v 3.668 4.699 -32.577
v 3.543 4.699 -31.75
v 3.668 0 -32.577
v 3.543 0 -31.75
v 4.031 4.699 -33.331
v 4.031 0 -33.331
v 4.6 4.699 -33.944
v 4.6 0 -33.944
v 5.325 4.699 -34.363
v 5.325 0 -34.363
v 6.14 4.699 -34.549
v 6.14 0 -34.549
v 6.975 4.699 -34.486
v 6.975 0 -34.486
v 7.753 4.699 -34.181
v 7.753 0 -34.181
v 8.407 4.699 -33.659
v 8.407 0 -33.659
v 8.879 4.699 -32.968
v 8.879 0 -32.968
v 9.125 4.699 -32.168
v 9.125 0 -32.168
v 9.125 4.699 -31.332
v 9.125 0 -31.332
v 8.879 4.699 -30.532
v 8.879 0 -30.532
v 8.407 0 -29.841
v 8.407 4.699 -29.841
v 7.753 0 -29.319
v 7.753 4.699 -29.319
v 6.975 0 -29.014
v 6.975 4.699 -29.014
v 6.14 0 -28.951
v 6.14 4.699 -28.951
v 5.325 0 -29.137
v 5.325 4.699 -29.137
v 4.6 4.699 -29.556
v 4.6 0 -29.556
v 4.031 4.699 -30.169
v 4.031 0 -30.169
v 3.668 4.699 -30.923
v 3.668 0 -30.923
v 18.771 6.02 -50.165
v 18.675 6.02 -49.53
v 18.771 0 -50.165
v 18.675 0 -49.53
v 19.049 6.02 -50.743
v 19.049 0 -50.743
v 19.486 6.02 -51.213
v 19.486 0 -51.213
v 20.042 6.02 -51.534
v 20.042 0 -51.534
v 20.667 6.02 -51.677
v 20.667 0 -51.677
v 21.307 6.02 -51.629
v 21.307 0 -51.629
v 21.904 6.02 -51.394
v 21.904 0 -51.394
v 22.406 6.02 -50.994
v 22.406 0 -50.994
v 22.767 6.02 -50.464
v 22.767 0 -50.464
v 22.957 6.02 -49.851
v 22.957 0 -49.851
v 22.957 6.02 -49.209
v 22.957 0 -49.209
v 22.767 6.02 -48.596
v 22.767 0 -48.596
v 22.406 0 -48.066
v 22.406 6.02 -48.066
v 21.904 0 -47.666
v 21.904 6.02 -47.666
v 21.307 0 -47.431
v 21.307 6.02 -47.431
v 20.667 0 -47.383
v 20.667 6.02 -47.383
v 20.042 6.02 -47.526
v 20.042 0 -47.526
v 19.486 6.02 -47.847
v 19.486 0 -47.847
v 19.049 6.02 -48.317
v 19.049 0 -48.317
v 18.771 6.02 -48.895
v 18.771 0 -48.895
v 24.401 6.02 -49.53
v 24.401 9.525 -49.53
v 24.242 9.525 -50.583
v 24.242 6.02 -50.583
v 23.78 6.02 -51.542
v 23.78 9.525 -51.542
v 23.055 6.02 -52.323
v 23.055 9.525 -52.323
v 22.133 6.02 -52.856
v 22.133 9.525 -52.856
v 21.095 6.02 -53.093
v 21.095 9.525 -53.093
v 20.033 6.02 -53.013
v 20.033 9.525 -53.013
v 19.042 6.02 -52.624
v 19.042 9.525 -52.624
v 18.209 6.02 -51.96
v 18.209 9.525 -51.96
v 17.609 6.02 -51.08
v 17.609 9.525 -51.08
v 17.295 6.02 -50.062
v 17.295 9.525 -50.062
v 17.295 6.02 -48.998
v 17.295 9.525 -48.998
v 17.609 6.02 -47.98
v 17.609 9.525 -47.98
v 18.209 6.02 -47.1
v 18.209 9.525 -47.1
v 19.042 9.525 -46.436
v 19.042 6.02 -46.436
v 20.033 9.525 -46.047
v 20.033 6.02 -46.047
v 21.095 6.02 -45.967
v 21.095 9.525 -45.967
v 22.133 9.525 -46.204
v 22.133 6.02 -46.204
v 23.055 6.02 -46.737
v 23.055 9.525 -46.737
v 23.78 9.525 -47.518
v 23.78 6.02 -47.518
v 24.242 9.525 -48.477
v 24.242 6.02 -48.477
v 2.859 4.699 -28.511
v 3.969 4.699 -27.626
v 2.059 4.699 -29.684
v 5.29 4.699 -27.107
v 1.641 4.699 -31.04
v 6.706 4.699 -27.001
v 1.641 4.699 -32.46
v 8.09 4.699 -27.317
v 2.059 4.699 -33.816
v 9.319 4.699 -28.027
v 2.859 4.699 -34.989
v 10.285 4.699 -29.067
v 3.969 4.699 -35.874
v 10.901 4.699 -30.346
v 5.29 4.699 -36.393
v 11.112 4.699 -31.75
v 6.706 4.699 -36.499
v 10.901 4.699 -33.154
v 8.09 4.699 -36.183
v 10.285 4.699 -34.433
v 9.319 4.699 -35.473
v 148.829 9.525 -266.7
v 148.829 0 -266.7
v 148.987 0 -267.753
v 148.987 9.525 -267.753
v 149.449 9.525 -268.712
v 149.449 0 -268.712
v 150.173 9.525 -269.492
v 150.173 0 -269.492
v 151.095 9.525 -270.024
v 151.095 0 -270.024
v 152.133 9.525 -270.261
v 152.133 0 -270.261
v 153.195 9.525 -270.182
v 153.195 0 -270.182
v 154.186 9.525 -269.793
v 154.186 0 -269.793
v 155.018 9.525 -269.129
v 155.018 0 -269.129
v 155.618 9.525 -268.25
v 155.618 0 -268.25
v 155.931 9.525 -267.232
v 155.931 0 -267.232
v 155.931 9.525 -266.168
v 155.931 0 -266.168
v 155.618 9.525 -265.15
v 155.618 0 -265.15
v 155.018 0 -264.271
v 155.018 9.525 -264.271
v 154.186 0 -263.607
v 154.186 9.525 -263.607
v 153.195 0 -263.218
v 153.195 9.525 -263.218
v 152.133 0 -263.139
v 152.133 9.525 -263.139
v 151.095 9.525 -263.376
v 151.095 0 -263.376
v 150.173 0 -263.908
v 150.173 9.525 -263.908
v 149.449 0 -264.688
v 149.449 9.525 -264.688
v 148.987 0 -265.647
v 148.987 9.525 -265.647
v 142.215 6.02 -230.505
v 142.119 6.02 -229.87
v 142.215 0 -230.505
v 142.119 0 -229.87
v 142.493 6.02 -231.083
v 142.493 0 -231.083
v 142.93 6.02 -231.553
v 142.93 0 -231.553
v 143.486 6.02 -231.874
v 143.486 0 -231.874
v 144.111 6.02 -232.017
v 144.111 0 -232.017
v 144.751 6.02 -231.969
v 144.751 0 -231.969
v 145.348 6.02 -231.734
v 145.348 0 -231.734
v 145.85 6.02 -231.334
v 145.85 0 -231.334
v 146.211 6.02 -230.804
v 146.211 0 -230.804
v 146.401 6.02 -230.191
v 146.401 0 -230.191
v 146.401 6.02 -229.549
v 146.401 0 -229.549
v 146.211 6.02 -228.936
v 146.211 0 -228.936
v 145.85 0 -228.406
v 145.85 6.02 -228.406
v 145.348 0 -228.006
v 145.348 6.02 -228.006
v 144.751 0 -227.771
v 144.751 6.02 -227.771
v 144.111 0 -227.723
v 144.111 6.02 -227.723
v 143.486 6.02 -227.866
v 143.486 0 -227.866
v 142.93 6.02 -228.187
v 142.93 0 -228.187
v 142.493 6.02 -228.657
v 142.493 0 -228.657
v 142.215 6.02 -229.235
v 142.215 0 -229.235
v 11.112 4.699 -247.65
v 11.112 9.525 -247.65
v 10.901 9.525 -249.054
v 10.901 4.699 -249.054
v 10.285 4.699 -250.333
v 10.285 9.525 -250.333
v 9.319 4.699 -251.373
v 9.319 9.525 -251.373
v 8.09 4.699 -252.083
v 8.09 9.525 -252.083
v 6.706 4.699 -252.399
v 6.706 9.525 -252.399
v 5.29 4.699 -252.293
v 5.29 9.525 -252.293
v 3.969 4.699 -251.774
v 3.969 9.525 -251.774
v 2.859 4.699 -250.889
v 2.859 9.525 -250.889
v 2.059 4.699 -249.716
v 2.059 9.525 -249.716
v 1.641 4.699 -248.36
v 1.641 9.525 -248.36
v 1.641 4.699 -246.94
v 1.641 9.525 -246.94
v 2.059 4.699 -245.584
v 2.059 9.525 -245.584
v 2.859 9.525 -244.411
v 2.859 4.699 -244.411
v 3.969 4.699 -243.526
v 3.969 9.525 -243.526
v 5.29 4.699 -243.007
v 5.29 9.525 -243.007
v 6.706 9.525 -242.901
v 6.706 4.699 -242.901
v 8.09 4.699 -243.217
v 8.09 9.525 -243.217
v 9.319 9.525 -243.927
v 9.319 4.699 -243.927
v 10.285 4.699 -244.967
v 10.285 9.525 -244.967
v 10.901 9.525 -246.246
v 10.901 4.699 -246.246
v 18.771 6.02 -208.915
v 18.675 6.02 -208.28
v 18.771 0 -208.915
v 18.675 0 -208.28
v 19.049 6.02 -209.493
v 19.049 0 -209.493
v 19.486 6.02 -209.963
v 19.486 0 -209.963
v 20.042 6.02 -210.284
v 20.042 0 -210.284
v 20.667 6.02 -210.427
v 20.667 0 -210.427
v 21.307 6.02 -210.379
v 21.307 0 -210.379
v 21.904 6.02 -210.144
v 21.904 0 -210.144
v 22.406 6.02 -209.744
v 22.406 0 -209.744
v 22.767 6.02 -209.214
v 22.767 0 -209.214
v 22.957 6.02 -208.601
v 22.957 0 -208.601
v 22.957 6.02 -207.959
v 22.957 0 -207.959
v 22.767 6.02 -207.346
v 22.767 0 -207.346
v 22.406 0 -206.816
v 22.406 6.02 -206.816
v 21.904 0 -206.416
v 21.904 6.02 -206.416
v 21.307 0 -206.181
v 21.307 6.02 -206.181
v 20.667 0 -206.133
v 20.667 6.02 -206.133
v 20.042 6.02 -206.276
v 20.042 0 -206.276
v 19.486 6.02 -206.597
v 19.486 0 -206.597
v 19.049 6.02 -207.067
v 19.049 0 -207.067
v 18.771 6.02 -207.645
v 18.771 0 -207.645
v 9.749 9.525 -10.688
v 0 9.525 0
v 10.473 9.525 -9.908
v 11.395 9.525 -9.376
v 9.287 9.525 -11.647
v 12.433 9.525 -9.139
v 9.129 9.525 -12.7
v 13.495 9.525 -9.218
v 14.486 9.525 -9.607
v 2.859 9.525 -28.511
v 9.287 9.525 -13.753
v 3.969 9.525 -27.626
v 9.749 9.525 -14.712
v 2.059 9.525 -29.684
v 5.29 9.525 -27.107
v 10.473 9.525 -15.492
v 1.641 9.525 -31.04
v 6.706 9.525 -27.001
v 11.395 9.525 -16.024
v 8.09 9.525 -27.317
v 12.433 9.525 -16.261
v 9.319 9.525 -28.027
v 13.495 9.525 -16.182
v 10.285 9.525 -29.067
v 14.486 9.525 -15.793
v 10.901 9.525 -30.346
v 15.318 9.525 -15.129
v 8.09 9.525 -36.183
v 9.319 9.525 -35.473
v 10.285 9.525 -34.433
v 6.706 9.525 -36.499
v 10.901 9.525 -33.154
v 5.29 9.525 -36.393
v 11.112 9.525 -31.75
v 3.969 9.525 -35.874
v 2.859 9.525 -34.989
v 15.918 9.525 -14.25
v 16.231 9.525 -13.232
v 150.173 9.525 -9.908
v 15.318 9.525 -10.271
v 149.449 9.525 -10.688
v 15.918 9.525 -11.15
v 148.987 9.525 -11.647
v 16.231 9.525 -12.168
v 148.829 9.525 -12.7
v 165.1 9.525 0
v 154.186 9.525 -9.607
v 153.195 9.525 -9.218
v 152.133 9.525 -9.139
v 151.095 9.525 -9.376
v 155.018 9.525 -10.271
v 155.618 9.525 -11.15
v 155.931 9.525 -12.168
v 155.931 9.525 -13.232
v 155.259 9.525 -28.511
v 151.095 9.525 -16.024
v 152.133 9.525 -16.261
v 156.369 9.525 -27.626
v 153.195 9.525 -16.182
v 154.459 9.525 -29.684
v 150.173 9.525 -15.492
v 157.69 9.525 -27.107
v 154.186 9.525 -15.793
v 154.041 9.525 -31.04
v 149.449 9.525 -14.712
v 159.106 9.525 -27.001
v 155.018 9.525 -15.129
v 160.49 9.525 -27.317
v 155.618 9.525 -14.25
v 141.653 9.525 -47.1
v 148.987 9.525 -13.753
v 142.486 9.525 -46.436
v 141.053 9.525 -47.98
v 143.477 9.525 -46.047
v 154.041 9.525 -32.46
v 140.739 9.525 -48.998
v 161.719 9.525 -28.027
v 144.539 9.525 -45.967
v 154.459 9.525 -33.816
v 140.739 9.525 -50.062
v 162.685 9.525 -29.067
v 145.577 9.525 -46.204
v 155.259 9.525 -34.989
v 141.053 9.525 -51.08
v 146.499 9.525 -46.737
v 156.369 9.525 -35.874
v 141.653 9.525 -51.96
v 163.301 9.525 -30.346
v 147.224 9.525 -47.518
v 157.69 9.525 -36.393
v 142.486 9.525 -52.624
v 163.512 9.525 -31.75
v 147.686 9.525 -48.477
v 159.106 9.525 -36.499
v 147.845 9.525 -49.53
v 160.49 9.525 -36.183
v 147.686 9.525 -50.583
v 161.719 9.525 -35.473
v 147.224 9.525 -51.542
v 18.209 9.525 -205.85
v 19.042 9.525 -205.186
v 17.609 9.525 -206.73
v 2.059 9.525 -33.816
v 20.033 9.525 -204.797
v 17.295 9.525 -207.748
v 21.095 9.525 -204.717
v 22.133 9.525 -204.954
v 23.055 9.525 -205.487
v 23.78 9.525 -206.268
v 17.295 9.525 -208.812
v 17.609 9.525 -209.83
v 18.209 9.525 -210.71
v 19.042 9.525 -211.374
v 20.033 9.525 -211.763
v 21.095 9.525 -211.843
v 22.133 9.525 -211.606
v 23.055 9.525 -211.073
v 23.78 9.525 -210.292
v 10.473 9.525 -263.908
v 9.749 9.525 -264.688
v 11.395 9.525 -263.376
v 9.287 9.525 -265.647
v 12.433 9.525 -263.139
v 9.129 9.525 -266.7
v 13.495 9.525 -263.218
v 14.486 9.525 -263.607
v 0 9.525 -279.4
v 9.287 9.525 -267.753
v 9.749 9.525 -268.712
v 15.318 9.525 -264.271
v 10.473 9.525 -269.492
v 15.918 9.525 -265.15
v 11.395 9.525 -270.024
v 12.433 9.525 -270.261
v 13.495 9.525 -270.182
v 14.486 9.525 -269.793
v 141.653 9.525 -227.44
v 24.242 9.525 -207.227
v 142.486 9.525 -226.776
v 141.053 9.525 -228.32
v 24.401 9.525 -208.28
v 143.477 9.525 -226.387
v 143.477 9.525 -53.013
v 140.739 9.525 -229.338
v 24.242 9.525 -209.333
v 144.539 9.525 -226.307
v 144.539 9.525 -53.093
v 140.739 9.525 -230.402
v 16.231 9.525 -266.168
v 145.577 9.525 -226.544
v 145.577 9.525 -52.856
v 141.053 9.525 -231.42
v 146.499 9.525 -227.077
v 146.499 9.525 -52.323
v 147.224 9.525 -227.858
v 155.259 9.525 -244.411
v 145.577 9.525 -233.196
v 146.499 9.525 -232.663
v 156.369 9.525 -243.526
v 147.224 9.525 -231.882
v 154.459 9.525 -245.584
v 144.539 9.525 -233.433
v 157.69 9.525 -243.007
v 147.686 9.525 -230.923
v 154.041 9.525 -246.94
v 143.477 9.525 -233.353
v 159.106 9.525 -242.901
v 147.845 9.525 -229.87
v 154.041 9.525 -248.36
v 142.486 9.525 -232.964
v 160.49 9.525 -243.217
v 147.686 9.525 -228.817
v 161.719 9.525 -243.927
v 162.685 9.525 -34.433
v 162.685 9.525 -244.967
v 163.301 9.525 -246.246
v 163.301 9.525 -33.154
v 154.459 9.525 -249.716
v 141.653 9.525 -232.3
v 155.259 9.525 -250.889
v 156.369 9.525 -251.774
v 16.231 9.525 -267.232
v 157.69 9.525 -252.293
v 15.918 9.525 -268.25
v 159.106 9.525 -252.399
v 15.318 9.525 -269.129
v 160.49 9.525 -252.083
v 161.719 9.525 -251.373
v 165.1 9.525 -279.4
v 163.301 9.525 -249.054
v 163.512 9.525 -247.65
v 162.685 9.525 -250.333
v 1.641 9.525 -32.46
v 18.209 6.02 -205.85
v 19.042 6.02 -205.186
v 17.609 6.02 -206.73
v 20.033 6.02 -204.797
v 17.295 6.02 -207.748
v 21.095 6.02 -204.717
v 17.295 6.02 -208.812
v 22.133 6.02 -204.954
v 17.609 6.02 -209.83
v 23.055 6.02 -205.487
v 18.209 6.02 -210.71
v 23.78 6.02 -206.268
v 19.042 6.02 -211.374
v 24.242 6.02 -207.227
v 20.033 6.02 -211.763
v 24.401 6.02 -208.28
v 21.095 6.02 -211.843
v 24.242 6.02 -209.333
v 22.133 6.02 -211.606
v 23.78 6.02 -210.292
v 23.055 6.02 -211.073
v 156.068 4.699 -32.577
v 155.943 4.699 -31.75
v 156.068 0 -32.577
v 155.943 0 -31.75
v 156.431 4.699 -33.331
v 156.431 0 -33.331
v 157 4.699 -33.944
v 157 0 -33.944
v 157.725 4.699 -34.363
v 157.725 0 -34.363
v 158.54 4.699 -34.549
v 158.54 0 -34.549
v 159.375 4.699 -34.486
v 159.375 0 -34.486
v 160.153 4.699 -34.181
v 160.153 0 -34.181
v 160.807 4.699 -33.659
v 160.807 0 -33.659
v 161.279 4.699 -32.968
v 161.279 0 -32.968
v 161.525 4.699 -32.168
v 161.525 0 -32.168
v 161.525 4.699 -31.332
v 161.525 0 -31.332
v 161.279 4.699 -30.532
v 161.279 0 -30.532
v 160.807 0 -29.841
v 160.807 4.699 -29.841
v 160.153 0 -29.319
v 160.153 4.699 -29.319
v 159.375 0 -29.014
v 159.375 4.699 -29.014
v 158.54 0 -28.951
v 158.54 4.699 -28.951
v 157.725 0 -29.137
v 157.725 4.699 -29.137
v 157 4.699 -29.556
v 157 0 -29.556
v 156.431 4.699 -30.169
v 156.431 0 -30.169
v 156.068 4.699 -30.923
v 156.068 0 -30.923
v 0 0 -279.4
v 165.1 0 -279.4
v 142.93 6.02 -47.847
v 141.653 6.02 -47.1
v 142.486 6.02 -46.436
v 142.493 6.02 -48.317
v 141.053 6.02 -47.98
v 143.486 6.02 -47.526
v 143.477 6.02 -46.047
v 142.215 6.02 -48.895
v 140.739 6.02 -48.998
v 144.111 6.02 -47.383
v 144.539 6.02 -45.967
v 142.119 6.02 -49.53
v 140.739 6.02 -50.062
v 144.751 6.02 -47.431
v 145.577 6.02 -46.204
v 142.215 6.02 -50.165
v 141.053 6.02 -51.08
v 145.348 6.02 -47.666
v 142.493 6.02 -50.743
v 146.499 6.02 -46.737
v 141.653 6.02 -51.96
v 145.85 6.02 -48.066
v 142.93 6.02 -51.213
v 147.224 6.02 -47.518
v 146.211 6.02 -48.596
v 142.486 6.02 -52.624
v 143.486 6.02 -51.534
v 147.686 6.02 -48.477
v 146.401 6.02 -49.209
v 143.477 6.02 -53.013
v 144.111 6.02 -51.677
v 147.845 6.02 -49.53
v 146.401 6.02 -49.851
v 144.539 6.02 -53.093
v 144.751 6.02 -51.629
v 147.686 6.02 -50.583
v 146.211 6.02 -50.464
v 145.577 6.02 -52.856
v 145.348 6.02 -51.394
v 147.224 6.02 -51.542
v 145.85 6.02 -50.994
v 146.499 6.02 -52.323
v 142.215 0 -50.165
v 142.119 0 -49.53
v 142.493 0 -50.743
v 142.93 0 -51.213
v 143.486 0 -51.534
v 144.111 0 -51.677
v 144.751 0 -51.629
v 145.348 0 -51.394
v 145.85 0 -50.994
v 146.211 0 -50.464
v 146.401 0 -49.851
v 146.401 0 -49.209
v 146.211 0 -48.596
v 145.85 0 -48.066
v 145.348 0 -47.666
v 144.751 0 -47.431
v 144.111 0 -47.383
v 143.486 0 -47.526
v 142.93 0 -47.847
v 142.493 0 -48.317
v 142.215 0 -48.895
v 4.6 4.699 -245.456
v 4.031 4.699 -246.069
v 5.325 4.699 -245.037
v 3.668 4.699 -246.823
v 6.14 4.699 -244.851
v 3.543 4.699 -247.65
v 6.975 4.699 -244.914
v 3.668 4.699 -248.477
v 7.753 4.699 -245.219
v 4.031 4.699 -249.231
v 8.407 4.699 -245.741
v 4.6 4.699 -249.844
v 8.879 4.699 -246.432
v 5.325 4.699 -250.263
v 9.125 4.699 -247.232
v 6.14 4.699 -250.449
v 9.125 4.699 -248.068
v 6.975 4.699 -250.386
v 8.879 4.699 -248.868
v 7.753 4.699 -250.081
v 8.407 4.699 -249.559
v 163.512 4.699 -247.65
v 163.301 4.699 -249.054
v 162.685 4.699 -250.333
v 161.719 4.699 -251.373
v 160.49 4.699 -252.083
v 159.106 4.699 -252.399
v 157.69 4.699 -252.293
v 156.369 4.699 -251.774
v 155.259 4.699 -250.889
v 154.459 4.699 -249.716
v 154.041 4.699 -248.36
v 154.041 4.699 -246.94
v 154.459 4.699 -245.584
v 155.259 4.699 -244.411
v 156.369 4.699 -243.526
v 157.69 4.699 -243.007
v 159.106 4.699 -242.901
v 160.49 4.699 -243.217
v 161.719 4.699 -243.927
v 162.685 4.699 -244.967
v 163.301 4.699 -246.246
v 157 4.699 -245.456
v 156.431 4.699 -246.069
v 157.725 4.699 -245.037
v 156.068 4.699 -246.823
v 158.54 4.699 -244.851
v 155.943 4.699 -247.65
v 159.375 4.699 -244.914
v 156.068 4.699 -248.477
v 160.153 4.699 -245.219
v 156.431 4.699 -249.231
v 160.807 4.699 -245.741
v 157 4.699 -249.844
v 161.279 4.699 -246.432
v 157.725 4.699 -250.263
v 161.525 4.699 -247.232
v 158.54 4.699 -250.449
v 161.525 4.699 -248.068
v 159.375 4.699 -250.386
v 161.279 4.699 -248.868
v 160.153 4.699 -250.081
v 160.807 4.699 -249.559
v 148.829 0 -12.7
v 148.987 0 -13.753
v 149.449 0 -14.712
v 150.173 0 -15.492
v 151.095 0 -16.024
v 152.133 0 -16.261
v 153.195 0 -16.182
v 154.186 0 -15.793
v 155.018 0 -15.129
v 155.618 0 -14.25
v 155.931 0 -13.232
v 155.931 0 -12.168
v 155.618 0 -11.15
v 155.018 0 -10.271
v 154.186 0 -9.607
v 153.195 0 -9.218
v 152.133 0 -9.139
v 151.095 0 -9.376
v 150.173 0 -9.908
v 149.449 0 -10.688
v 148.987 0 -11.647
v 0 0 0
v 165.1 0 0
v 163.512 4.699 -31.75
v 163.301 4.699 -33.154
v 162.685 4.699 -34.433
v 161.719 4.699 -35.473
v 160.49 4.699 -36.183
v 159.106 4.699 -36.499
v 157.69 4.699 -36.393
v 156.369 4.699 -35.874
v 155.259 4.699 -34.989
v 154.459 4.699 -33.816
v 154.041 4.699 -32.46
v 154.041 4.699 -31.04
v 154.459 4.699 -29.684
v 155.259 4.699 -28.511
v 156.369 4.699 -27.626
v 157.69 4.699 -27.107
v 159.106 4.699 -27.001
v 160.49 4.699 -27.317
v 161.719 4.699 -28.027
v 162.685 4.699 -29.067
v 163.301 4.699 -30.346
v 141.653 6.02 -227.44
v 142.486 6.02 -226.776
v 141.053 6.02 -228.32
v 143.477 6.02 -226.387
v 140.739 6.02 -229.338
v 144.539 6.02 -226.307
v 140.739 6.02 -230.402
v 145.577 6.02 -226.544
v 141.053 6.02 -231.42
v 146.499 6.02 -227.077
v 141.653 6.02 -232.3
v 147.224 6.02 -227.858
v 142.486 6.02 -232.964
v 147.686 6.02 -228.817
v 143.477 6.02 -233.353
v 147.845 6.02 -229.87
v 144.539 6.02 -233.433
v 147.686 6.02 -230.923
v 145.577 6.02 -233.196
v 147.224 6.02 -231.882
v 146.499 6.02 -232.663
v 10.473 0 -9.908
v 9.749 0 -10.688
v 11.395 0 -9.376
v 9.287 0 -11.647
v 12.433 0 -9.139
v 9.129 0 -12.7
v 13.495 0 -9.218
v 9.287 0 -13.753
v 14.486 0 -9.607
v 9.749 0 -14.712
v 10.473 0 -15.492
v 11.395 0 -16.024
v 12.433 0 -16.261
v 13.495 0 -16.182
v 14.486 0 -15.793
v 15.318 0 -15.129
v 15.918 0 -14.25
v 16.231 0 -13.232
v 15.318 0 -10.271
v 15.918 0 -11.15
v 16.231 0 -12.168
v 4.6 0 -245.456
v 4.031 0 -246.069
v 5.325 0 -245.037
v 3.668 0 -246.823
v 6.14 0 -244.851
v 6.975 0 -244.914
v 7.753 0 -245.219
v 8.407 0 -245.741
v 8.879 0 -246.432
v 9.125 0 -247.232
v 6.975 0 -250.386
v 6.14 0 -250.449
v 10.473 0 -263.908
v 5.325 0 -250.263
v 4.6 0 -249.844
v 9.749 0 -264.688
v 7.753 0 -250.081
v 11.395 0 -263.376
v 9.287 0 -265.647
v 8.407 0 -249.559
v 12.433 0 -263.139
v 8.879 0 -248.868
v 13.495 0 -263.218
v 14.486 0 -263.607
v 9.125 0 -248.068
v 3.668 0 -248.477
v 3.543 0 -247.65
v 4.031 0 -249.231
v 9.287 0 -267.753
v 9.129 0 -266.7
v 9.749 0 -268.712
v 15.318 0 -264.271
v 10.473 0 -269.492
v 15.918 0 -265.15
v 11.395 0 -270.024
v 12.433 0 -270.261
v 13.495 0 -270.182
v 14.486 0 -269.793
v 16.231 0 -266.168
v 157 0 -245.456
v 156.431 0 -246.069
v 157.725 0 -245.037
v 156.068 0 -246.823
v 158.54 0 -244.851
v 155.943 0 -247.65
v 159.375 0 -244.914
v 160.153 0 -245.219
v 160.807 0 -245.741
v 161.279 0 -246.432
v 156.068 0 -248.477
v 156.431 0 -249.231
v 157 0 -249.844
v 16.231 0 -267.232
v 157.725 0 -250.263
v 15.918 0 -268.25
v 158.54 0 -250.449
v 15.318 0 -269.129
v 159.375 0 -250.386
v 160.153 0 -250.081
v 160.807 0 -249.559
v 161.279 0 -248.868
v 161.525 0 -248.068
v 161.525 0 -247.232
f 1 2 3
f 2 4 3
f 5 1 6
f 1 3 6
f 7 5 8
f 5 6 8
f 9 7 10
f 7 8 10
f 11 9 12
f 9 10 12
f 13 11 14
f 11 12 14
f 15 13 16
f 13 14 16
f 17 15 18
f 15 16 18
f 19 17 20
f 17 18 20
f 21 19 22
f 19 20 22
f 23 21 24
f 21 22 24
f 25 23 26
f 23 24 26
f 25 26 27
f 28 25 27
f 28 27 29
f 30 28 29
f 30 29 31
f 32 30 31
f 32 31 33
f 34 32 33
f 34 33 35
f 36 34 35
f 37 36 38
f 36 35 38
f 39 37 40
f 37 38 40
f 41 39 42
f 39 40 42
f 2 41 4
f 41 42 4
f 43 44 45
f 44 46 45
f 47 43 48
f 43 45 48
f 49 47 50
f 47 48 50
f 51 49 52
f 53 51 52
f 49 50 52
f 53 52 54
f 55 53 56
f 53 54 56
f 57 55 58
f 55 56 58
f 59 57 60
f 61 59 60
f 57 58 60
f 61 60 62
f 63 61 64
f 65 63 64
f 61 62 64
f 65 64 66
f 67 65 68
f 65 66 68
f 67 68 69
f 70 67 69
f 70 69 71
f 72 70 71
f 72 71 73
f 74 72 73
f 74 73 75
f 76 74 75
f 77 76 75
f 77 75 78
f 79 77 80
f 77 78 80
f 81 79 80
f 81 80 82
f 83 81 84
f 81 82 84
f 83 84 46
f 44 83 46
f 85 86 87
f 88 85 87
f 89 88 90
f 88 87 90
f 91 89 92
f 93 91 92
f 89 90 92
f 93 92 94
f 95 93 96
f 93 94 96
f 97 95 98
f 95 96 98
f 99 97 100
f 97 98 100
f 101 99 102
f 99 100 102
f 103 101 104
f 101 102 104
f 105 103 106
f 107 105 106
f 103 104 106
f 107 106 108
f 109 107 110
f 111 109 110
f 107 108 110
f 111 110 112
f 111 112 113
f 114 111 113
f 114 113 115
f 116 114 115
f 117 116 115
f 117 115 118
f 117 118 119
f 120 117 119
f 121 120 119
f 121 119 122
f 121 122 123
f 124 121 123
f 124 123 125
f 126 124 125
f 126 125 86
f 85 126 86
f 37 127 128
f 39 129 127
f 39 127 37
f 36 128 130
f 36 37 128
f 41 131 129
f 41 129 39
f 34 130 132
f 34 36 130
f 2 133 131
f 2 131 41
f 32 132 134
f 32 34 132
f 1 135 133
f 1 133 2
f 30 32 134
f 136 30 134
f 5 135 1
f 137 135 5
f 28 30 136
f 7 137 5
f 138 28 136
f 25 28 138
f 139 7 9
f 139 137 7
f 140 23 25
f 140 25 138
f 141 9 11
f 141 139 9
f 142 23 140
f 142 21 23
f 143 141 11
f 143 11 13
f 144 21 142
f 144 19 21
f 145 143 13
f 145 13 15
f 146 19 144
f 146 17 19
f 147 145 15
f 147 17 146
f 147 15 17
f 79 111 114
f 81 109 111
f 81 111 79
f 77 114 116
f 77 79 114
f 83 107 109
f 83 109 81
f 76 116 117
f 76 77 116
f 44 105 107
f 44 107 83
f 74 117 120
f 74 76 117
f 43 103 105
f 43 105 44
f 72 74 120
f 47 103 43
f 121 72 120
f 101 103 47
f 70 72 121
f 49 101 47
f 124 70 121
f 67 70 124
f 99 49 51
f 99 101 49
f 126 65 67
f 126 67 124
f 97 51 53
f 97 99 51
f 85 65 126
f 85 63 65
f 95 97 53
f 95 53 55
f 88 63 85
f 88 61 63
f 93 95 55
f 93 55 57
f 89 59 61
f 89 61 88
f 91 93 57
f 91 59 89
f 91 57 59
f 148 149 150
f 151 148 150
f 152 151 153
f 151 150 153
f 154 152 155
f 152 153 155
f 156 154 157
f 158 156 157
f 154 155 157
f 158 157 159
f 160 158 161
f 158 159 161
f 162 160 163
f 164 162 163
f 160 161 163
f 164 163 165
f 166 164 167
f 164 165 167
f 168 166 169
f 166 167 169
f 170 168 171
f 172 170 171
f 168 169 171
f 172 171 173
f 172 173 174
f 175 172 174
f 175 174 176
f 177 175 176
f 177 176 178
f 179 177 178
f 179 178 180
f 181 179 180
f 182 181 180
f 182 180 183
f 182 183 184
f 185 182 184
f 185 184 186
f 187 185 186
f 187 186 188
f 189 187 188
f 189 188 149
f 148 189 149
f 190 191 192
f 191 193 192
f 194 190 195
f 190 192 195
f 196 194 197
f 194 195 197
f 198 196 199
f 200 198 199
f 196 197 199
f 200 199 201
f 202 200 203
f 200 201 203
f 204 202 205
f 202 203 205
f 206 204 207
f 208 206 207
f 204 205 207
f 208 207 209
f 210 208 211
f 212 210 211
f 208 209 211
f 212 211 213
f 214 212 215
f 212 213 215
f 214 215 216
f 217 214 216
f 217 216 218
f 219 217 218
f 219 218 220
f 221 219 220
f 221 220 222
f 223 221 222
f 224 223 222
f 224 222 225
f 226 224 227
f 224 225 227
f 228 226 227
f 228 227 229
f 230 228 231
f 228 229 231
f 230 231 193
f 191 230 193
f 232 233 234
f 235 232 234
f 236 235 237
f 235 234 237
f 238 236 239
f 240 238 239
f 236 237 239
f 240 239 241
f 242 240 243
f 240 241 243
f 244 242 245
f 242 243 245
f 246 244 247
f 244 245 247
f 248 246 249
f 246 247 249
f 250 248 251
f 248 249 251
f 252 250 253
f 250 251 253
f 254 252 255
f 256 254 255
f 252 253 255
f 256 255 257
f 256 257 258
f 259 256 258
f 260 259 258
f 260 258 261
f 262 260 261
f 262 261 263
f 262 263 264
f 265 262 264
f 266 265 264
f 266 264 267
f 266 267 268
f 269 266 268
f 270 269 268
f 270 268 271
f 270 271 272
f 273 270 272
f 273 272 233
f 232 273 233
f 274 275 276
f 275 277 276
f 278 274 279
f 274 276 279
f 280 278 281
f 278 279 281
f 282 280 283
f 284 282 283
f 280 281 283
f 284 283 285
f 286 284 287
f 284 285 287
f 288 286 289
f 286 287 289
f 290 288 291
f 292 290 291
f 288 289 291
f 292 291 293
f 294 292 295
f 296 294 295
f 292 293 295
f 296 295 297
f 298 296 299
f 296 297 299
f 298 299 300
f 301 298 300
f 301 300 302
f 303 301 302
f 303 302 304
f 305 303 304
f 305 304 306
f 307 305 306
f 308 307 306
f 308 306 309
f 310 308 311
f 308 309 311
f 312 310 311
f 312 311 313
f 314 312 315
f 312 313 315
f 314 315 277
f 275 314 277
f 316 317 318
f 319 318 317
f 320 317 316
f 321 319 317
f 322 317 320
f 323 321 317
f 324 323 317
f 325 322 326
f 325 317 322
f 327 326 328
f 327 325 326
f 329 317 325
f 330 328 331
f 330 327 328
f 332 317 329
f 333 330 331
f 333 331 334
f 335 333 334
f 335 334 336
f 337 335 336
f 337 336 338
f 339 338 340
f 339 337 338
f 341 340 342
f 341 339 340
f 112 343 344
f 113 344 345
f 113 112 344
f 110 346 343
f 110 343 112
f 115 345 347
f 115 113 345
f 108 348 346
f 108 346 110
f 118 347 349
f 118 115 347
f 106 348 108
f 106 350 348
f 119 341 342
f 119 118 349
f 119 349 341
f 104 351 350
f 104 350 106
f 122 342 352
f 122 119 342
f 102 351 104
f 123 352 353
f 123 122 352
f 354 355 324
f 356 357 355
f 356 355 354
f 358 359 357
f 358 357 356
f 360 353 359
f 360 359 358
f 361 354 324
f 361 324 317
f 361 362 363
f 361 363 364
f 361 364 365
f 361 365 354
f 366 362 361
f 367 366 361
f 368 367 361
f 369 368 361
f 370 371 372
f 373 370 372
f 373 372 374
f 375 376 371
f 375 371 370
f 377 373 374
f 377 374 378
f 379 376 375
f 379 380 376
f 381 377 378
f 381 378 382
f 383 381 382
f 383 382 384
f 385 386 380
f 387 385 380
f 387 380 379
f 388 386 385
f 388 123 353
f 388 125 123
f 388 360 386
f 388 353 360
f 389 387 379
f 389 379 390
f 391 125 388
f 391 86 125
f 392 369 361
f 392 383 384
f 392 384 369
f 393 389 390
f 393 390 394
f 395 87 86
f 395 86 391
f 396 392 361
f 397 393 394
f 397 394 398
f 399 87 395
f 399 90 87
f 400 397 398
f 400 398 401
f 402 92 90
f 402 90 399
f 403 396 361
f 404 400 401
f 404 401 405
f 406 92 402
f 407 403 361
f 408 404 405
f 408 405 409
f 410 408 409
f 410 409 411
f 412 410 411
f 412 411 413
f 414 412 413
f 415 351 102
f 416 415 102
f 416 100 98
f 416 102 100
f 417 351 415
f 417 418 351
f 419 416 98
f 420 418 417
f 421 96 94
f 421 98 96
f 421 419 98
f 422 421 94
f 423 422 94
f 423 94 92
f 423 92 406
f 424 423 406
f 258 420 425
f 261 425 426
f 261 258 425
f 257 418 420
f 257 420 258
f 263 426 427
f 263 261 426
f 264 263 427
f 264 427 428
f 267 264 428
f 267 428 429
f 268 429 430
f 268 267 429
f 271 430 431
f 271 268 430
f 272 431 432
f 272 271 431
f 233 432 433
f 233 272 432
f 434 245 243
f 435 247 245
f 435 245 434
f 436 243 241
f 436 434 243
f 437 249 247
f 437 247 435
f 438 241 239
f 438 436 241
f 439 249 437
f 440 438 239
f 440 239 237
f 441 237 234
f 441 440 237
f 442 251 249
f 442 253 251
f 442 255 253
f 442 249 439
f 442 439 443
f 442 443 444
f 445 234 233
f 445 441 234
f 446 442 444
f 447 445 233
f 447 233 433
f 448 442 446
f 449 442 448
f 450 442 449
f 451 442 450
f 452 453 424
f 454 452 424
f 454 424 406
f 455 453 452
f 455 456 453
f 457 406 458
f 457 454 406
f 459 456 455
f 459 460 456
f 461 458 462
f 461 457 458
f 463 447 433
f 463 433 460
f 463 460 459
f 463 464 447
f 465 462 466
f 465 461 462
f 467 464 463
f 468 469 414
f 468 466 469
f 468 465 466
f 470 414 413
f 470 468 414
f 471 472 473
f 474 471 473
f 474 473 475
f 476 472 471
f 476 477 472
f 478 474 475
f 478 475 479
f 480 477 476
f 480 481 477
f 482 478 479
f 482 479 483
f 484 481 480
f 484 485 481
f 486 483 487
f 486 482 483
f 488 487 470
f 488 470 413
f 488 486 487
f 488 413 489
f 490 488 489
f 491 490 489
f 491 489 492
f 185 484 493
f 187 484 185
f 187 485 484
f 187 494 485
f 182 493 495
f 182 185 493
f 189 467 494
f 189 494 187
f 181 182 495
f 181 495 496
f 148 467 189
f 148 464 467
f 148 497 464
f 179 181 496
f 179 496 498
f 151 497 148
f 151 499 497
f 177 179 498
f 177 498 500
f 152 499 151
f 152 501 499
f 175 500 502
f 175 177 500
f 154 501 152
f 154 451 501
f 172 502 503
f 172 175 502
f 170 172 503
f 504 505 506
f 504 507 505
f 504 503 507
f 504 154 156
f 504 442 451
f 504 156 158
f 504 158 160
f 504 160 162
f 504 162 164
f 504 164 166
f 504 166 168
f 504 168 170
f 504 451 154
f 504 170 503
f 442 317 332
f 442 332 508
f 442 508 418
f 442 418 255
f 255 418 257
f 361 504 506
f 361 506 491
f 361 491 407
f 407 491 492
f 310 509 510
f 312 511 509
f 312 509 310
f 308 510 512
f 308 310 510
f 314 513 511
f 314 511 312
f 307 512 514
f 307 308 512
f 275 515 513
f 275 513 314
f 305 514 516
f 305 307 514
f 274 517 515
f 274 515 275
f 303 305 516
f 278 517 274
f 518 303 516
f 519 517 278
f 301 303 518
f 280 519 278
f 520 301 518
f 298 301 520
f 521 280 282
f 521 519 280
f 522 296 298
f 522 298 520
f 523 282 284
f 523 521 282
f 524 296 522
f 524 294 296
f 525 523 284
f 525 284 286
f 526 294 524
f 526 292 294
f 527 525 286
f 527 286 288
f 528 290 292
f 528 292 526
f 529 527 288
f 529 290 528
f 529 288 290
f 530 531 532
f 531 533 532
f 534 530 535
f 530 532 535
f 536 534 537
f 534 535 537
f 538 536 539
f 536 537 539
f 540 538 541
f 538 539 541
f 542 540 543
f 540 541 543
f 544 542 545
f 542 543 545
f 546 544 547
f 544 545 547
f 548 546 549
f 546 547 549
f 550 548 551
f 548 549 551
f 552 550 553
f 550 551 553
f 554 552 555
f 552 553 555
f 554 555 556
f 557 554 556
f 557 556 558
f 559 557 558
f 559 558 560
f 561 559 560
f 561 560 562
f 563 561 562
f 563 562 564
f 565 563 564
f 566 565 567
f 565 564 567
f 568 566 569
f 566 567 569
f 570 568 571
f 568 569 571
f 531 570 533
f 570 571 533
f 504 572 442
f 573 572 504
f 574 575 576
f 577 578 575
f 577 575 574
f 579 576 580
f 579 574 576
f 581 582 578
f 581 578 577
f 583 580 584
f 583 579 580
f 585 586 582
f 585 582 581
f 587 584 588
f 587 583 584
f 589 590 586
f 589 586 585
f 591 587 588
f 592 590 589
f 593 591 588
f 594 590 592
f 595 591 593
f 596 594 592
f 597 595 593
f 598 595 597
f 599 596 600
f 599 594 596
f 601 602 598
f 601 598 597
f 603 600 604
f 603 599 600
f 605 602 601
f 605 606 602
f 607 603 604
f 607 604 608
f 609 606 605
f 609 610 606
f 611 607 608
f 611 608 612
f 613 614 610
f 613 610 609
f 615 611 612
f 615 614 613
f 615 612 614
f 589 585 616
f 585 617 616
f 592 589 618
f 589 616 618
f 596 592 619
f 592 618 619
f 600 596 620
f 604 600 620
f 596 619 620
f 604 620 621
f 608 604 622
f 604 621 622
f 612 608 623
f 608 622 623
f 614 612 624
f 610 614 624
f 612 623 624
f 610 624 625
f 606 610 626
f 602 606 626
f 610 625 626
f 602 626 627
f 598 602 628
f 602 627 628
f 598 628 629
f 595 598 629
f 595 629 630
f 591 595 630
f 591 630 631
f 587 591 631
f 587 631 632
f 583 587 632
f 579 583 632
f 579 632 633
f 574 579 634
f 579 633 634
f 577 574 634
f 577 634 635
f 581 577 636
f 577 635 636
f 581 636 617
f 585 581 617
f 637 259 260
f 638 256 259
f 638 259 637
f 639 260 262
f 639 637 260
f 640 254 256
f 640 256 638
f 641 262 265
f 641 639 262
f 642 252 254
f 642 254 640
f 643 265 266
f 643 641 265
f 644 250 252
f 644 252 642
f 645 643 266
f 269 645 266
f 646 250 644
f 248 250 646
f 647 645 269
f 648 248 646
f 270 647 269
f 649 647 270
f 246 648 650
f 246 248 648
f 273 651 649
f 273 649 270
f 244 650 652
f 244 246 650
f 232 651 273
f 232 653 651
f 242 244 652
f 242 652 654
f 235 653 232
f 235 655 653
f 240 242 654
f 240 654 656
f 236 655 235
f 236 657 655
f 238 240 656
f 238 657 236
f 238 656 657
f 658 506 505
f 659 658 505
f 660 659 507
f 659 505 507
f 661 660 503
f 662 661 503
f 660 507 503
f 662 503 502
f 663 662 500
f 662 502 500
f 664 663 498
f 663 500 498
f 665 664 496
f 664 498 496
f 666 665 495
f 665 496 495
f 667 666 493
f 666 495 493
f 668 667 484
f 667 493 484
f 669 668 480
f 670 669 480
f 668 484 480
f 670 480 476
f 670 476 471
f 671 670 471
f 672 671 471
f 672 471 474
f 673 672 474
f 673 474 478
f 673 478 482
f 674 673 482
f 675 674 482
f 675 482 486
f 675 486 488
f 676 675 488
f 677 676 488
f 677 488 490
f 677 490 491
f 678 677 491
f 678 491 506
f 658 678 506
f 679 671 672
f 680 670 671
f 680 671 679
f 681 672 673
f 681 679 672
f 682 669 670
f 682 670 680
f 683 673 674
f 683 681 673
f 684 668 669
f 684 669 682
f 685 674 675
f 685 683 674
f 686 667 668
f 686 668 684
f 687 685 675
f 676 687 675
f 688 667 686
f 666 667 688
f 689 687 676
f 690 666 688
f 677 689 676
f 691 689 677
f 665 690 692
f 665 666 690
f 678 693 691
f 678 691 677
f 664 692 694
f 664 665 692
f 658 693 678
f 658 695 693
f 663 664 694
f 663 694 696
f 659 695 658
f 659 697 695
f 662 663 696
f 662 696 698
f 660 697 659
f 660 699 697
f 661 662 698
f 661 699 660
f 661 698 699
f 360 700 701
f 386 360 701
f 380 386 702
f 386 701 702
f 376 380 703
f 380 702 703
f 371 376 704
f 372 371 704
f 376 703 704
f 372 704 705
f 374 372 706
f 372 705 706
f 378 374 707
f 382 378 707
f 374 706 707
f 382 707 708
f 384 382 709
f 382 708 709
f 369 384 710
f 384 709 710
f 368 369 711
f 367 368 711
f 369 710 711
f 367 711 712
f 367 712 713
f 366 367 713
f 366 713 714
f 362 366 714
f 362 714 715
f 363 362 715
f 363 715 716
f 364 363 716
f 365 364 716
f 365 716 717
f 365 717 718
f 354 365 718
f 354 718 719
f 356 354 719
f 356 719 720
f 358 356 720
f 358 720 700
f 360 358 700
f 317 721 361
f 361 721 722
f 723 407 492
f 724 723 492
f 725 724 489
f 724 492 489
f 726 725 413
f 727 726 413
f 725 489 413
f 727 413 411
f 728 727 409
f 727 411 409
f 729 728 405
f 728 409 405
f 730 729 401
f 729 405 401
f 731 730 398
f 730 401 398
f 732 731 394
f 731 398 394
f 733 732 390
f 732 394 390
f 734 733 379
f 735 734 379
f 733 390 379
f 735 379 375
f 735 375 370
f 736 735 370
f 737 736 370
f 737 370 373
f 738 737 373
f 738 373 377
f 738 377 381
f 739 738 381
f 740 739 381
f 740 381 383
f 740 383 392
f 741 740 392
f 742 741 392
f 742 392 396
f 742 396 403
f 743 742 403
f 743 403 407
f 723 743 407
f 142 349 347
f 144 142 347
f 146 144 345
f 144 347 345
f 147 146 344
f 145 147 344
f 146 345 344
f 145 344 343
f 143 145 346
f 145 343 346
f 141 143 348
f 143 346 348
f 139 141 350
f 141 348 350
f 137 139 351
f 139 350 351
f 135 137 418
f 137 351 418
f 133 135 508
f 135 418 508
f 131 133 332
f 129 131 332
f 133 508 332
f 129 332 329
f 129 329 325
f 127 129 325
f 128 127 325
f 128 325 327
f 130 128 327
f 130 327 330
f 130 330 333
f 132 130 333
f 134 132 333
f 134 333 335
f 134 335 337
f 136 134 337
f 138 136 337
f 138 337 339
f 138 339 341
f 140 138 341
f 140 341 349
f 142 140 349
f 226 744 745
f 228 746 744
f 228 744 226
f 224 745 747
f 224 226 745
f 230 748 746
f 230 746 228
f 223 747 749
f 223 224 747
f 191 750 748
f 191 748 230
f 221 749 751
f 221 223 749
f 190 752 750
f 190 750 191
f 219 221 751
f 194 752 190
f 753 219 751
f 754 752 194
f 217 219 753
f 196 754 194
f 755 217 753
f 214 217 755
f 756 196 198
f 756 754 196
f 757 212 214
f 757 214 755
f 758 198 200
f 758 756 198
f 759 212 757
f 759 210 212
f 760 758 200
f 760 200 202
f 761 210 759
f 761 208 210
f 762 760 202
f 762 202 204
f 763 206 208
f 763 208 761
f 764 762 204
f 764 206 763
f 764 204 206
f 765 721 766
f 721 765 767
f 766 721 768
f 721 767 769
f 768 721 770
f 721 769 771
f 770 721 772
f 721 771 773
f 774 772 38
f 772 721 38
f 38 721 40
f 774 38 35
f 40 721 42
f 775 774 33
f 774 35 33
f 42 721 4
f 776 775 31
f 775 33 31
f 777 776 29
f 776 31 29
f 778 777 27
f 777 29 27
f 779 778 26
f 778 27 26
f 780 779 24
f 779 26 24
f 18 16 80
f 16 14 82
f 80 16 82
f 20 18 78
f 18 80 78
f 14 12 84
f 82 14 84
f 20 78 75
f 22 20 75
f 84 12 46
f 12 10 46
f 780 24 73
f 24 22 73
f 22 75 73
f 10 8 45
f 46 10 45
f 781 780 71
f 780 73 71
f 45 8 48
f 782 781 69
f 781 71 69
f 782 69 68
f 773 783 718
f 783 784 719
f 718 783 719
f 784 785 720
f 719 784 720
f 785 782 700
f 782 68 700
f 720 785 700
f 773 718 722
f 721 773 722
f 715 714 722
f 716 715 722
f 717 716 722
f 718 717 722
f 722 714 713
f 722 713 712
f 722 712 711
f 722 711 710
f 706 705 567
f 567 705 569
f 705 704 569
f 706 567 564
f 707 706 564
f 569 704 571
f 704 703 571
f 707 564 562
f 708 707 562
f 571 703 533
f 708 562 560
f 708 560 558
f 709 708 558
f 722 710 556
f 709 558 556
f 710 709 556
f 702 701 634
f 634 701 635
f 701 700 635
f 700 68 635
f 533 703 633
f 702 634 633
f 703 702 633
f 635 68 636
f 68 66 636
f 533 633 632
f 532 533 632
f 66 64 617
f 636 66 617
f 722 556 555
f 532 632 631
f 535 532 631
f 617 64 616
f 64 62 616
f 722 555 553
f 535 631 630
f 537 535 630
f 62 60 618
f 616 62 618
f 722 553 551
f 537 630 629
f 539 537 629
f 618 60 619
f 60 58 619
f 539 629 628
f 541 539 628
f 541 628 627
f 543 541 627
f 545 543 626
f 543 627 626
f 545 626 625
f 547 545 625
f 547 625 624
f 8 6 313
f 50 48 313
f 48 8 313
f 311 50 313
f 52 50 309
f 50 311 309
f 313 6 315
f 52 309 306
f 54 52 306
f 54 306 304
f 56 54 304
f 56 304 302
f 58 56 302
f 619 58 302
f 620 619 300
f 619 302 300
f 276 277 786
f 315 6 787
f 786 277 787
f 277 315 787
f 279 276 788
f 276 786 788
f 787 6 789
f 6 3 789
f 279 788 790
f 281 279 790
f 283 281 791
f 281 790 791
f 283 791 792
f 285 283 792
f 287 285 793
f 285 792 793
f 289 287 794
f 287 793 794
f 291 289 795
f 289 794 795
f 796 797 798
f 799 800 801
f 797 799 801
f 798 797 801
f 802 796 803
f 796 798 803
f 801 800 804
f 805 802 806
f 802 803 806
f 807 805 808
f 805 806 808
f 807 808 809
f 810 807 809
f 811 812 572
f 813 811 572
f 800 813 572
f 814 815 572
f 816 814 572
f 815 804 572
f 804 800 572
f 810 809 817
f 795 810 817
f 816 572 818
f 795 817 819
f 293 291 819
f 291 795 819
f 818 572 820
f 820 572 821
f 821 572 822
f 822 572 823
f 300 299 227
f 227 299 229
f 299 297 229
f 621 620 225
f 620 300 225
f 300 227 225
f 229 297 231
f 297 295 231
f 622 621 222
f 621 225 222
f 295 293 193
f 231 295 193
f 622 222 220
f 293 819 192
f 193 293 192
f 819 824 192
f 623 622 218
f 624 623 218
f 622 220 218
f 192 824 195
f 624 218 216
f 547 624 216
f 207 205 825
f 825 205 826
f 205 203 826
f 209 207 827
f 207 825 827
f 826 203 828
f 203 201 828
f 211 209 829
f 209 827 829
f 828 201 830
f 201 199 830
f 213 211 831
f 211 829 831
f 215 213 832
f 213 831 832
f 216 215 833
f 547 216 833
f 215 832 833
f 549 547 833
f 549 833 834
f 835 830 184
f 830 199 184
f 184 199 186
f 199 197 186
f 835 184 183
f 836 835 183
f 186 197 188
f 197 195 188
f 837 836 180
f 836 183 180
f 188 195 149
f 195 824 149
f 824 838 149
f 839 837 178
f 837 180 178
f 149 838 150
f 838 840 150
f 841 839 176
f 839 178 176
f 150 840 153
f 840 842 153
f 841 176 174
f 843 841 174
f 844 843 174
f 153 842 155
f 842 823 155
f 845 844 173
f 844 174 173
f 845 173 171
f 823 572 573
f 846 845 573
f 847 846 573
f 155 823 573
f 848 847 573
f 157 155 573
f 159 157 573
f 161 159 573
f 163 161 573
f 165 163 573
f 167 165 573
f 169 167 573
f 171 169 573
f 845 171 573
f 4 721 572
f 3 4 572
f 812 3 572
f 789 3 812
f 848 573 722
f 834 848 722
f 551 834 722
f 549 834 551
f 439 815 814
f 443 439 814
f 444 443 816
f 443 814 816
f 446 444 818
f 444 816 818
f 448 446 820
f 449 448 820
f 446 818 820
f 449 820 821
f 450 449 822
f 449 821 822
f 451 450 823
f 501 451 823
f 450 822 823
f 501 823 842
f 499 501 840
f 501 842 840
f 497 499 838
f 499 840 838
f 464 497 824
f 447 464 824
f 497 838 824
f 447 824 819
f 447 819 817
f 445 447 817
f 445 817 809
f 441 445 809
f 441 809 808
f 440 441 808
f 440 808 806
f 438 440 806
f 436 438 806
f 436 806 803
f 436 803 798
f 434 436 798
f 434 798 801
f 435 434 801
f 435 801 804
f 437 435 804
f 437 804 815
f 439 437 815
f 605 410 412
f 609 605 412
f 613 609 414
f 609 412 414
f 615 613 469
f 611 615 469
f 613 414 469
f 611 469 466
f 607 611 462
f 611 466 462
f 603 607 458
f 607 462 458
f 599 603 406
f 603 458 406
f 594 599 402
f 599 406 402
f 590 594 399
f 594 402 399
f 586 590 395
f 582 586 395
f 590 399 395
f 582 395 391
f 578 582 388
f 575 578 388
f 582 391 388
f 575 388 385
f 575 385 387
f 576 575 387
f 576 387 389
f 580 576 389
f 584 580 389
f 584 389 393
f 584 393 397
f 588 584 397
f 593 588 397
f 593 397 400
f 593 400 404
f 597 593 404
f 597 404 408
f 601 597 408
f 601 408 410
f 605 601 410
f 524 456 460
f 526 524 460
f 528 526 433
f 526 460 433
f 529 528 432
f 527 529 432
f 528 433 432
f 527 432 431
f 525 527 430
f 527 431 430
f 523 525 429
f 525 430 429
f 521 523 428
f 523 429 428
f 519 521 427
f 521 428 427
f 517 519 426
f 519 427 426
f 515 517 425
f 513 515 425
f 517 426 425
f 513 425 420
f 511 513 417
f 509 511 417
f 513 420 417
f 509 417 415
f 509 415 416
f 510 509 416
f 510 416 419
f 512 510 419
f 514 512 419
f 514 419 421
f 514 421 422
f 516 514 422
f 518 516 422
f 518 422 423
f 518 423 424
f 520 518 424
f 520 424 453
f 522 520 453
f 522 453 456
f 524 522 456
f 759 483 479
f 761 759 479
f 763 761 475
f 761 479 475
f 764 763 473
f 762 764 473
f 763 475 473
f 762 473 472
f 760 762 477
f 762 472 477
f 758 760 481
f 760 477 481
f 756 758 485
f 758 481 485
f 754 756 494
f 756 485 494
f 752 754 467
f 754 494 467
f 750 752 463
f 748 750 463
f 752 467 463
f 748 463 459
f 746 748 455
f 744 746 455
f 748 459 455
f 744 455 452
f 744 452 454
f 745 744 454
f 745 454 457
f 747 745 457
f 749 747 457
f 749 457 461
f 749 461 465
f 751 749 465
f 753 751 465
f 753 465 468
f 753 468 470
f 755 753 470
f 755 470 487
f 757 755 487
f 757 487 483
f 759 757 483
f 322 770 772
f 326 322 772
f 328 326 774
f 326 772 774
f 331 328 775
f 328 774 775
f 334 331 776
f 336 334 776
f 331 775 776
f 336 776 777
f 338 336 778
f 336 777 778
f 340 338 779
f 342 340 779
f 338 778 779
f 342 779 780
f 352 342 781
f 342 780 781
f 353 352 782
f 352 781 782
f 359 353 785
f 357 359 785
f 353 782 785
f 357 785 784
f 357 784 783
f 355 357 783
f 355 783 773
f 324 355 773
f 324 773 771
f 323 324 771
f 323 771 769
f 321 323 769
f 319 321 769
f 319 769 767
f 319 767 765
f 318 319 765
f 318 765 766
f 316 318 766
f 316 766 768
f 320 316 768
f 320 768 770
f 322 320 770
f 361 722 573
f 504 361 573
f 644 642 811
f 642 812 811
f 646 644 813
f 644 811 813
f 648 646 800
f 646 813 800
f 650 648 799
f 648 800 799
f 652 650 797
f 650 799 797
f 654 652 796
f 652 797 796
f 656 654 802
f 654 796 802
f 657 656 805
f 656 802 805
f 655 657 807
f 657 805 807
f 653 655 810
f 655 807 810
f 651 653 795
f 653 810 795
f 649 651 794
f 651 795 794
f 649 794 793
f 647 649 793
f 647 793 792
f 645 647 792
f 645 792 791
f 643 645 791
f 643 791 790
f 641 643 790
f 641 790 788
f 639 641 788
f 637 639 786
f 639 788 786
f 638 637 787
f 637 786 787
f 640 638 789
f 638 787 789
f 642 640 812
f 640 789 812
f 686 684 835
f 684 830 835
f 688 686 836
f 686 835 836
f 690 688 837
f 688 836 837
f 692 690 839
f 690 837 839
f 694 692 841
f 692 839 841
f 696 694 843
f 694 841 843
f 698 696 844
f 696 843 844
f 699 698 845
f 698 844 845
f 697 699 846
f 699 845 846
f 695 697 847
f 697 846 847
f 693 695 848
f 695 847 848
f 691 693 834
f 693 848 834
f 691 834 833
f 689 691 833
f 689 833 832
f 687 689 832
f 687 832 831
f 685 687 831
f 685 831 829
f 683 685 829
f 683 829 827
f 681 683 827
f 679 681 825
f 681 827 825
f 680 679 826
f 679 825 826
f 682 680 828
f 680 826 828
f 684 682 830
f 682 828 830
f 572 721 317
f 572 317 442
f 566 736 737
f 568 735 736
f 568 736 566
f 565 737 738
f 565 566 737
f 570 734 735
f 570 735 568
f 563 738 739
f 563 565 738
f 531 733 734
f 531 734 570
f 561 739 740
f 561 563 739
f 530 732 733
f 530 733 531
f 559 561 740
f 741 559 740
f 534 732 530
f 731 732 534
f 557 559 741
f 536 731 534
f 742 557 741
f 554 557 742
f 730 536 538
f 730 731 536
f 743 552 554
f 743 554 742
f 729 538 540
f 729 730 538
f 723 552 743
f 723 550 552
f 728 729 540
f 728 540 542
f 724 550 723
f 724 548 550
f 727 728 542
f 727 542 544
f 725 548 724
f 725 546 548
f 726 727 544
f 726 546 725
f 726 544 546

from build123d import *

# Parameters (mm, degrees)
SKETCH1_W                                       = 165.1
SKETCH1_H                                       = 279.4
BOSS_EXTRUDE1_DEPTH                             = 9.525
F_1_4_CLEARANCE_HOLE1_D                         = 7.14248
CBORE_FOR_10_SOCKET_HEAD_CAP_SCREW1_D           = 5.6134
CBORE_FOR_10_SOCKET_HEAD_CAP_SCREW1_CBORE_D     = 9.525
CBORE_FOR_10_SOCKET_HEAD_CAP_SCREW1_CBORE_DEPTH = 4.826
CBORE_FOR_6_SOCKET_HEAD_CAP_SCREW1_D            = 4.3053
CBORE_FOR_6_SOCKET_HEAD_CAP_SCREW1_CBORE_D      = 7.14502
CBORE_FOR_6_SOCKET_HEAD_CAP_SCREW1_CBORE_DEPTH  = 3.5052


with BuildPart() as part:
    # Sketch1 → Boss-Extrude1 (new body)
    with BuildSketch(Plane(origin=(0, 0, 0), x_dir=(1, 0, 0), z_dir=(0, 1, 0))):
        with Locations((82.55, 139.7)):
            Rectangle(SKETCH1_W, SKETCH1_H)
    extrude(amount=BOSS_EXTRUDE1_DEPTH)

    # 1/4 Clearance Hole1 (through all)
    with Locations(Plane(origin=(0, 9.525, 0), x_dir=(1, 0, 0), z_dir=(0, 1, 0))):
        with Locations((152.4, 12.7), (12.7, 12.7), (12.7, 266.7), (152.4, 266.7)):
            Hole(F_1_4_CLEARANCE_HOLE1_D / 2)

    # CBORE for #10 Socket Head Cap Screw1 (through all)
    with Locations(Plane(origin=(0, 9.525, 0), x_dir=(1, 0, 0), z_dir=(0, 1, 0))):
        with Locations((6.35, 247.65), (6.35, 31.75), (158.75, 31.75), (158.75, 247.65)):
            CounterBoreHole(CBORE_FOR_10_SOCKET_HEAD_CAP_SCREW1_D / 2, CBORE_FOR_10_SOCKET_HEAD_CAP_SCREW1_CBORE_D / 2, CBORE_FOR_10_SOCKET_HEAD_CAP_SCREW1_CBORE_DEPTH)

    # CBORE for #6 Socket Head Cap Screw1 (through all)
    with Locations(Plane(origin=(0, 9.525, 0), x_dir=(1, 0, 0), z_dir=(0, 1, 0))):
        with Locations((144.272, 229.87), (144.272, 49.53), (20.828, 49.53), (20.828, 208.28)):
            CounterBoreHole(CBORE_FOR_6_SOCKET_HEAD_CAP_SCREW1_D / 2, CBORE_FOR_6_SOCKET_HEAD_CAP_SCREW1_CBORE_D / 2, CBORE_FOR_6_SOCKET_HEAD_CAP_SCREW1_CBORE_DEPTH)


solid = part.part
